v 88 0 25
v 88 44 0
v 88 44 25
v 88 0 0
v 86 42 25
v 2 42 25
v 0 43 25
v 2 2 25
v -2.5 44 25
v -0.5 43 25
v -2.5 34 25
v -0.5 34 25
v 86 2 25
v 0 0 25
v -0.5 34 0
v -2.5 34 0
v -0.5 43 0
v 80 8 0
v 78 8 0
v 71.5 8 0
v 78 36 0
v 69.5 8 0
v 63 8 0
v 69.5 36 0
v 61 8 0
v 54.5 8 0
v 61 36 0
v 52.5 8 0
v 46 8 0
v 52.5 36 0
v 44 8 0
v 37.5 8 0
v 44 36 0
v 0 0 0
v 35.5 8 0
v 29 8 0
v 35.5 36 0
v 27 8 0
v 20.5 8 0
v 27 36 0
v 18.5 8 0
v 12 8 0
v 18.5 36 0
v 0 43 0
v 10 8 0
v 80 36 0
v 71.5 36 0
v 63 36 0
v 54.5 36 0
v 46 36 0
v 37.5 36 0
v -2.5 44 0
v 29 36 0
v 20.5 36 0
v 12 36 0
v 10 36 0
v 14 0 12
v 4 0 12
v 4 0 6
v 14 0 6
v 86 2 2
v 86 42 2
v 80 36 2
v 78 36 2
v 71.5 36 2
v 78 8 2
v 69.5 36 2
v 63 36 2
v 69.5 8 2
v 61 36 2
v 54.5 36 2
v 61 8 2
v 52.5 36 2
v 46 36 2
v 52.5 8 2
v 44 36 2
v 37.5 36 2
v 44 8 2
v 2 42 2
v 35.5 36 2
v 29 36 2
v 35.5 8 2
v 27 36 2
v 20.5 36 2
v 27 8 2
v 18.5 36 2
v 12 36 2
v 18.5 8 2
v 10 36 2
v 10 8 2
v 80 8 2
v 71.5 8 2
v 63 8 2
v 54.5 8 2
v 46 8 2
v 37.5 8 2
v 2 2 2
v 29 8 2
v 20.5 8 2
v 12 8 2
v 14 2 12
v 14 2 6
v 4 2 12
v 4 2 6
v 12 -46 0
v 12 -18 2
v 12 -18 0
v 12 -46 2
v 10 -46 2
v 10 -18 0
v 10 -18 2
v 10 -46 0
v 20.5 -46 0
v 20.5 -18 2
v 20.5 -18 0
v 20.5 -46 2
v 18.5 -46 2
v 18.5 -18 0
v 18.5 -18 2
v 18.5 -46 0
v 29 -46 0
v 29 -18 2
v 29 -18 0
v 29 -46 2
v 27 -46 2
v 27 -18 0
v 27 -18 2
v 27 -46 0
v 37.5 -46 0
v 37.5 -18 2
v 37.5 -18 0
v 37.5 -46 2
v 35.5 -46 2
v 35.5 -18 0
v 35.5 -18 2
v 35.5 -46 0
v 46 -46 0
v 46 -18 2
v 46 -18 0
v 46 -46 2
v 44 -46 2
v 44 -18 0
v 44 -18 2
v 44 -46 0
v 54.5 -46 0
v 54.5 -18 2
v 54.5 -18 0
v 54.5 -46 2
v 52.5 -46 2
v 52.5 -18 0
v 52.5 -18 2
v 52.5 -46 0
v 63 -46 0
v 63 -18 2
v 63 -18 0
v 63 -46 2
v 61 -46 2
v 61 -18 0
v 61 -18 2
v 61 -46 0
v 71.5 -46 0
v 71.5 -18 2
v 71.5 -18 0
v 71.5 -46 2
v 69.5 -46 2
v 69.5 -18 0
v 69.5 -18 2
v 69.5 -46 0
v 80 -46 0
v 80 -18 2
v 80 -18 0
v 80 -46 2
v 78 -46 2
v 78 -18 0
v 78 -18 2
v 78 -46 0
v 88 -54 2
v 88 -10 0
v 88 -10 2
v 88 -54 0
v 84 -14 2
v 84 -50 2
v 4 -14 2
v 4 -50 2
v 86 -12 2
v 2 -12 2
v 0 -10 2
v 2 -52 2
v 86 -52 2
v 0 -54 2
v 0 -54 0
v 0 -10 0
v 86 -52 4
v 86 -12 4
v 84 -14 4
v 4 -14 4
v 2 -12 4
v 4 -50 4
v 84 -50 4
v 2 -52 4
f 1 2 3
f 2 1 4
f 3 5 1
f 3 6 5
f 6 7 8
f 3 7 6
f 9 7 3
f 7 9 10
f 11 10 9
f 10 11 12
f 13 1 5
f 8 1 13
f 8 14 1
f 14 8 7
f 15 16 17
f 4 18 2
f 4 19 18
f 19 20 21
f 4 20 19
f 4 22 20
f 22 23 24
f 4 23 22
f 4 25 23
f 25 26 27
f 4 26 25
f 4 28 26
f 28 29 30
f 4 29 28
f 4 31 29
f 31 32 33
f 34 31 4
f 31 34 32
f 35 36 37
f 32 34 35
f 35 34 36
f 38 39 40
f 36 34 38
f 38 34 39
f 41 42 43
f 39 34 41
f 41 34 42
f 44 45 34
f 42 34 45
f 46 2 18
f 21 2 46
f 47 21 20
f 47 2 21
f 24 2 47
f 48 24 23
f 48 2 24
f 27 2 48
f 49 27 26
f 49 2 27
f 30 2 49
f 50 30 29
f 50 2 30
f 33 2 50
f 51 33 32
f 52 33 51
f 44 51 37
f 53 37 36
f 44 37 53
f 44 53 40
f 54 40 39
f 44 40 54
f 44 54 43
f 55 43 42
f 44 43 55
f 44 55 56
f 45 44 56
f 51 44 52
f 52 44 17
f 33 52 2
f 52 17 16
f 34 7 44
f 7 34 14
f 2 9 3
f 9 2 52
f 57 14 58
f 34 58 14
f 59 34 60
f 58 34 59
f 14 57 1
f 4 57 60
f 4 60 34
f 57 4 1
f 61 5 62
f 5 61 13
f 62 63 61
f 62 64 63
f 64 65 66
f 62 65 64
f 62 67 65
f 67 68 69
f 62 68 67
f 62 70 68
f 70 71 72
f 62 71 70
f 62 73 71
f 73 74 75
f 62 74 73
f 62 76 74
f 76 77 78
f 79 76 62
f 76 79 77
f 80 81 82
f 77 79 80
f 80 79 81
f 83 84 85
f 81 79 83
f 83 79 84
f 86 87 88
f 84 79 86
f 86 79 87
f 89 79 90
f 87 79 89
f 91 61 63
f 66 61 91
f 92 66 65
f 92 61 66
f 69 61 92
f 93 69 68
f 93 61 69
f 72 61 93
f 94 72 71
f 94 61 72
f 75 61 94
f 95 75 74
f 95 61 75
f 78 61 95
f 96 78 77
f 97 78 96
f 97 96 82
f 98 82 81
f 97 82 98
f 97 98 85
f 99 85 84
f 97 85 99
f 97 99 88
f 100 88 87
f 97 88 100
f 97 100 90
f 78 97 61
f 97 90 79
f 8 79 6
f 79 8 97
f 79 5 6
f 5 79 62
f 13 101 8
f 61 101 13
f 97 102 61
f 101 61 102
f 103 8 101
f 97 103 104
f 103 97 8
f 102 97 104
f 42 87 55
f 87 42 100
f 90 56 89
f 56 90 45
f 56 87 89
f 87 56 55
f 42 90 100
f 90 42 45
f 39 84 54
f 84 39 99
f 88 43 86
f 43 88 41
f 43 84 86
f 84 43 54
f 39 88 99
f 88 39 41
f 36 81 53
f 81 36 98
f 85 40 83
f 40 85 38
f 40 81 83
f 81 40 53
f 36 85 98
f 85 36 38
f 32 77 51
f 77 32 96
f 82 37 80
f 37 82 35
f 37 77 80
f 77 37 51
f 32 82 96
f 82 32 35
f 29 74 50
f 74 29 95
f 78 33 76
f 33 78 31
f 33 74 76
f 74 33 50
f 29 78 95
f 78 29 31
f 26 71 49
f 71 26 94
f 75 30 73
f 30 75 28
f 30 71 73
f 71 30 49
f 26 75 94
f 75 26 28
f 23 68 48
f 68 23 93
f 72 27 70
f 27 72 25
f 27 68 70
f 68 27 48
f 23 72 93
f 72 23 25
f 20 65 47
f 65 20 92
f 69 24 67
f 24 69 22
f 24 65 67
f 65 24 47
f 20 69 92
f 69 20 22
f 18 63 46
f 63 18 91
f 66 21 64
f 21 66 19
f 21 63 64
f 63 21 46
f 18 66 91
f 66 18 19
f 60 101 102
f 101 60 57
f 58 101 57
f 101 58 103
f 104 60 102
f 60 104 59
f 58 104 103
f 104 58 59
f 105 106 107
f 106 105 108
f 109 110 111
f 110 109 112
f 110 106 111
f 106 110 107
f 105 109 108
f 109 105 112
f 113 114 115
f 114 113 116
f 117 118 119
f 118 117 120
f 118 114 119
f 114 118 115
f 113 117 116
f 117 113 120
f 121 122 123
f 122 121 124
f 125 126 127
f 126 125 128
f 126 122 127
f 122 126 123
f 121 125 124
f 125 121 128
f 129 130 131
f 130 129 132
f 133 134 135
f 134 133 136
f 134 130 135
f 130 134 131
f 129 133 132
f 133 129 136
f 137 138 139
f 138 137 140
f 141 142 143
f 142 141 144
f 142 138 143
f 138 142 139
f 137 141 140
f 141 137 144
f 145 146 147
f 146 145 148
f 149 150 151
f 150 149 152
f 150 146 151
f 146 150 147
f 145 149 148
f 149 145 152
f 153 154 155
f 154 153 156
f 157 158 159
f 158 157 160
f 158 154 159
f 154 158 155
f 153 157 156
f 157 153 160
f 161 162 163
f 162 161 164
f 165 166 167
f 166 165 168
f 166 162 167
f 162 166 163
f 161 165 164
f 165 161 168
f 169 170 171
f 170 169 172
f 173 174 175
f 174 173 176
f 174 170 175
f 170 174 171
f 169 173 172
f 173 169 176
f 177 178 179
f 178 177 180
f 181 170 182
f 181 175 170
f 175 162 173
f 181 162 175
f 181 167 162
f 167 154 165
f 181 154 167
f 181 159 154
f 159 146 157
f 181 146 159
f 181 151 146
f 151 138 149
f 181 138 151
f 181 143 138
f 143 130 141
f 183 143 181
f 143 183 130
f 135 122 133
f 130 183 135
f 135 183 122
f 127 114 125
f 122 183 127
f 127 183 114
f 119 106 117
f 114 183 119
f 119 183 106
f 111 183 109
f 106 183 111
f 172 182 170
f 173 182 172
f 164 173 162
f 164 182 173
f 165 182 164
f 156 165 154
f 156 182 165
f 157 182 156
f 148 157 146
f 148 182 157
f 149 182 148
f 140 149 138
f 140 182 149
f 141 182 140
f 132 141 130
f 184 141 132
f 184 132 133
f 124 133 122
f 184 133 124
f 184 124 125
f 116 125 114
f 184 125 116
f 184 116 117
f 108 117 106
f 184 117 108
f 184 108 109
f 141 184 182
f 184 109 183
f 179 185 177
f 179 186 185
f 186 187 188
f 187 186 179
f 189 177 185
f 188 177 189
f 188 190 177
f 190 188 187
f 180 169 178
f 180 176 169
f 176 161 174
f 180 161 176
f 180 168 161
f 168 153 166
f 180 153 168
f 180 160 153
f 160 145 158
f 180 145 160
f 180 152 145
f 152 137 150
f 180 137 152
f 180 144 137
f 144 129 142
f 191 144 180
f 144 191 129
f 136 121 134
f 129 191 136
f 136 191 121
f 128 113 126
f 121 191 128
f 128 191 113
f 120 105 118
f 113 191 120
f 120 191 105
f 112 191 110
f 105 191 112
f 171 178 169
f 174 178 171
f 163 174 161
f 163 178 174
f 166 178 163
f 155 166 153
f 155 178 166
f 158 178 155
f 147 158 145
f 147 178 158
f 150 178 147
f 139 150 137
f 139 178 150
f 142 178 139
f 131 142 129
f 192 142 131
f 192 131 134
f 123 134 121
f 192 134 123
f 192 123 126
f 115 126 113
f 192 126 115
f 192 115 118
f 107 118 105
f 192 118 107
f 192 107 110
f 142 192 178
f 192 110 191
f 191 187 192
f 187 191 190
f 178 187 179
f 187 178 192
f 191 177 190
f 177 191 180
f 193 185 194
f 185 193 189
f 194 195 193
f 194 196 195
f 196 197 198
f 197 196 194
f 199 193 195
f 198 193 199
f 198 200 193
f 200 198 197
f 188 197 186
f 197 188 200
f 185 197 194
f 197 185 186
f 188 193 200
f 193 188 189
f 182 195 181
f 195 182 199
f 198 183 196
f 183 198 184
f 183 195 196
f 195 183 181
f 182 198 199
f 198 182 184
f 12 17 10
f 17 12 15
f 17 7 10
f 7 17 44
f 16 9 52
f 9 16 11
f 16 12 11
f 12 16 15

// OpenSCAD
wall_thickness = 2;
base_width = 88;
base_depth = 44;
case_height = 25;
gaggia_steel_thickness = 0.5;
slitcount = 8;
slitwidth = 2;


/*
*   Definition of body. 
*/

module base()
{
  cube([base_width,base_depth, case_height]);
}

module interior()
{
  cube([base_width-4,base_depth-4,case_height]);
}

module base_block() {
  difference() {
    base();
    translate([wall_thickness,wall_thickness,wall_thickness])
        interior();
  }
}

module bottom_slits() {    
    gap = ((base_width - (10 * wall_thickness) - (slitcount*slitwidth))) / slitcount;
    for (i = [0:8]){
       translate([(5*wall_thickness)+(i*(gap+slitwidth)), (4 * wall_thickness), -1])
       cube([2, base_depth - (8 * wall_thickness), wall_thickness + 2]);
    }
}

module cable_inlet()
{
    cube([10,4,6]);
}

module slitted_lower_part()
{
    difference(){
        base_block();
        bottom_slits();
        }
}

module hook()
{
    translate([-gaggia_steel_thickness, base_depth - 1, 0])
    {
        cube([gaggia_steel_thickness, 1, case_height]);
    }
    translate([-gaggia_steel_thickness - wall_thickness, base_depth - 10, 0])
    {
        cube([wall_thickness, 10, case_height]);
    }

}



module complete_lower_part()
{
    difference(){
        slitted_lower_part();
        translate([4,-1,6])
        {
            cable_inlet();
        }
    }
}

/*
* Lid definition starts here
*/

module lid_body()
{

        cube([base_width,base_depth, wall_thickness]);
}


module top_slits() {    
    gap = ((base_width - (10 * wall_thickness) - (slitcount*slitwidth))) / slitcount;
    for (i = [0:8]){
       translate([(5*wall_thickness)+(i*(gap+slitwidth)), (4 * wall_thickness), -1])
       cube([2, base_depth - (8 * wall_thickness), wall_thickness + 2]);
    }
}


module snap_frame()
{
    difference(){
        cube([base_width - wall_thickness*2,base_depth  - wall_thickness*2, wall_thickness]);
        translate([wall_thickness, wall_thickness, -1]){   
            cube([base_width - wall_thickness*4,base_depth  - wall_thickness*4, wall_thickness +2]);
        }
    }
}


module lid()
{
    difference()
    {
        lid_body();
         
        top_slits();
    }
    translate([wall_thickness, wall_thickness, wall_thickness])
    {
        snap_frame();
    }
}

//slits();

complete_lower_part();

translate([0, -base_depth - 10, 0])
{
    lid();
}

hook();
